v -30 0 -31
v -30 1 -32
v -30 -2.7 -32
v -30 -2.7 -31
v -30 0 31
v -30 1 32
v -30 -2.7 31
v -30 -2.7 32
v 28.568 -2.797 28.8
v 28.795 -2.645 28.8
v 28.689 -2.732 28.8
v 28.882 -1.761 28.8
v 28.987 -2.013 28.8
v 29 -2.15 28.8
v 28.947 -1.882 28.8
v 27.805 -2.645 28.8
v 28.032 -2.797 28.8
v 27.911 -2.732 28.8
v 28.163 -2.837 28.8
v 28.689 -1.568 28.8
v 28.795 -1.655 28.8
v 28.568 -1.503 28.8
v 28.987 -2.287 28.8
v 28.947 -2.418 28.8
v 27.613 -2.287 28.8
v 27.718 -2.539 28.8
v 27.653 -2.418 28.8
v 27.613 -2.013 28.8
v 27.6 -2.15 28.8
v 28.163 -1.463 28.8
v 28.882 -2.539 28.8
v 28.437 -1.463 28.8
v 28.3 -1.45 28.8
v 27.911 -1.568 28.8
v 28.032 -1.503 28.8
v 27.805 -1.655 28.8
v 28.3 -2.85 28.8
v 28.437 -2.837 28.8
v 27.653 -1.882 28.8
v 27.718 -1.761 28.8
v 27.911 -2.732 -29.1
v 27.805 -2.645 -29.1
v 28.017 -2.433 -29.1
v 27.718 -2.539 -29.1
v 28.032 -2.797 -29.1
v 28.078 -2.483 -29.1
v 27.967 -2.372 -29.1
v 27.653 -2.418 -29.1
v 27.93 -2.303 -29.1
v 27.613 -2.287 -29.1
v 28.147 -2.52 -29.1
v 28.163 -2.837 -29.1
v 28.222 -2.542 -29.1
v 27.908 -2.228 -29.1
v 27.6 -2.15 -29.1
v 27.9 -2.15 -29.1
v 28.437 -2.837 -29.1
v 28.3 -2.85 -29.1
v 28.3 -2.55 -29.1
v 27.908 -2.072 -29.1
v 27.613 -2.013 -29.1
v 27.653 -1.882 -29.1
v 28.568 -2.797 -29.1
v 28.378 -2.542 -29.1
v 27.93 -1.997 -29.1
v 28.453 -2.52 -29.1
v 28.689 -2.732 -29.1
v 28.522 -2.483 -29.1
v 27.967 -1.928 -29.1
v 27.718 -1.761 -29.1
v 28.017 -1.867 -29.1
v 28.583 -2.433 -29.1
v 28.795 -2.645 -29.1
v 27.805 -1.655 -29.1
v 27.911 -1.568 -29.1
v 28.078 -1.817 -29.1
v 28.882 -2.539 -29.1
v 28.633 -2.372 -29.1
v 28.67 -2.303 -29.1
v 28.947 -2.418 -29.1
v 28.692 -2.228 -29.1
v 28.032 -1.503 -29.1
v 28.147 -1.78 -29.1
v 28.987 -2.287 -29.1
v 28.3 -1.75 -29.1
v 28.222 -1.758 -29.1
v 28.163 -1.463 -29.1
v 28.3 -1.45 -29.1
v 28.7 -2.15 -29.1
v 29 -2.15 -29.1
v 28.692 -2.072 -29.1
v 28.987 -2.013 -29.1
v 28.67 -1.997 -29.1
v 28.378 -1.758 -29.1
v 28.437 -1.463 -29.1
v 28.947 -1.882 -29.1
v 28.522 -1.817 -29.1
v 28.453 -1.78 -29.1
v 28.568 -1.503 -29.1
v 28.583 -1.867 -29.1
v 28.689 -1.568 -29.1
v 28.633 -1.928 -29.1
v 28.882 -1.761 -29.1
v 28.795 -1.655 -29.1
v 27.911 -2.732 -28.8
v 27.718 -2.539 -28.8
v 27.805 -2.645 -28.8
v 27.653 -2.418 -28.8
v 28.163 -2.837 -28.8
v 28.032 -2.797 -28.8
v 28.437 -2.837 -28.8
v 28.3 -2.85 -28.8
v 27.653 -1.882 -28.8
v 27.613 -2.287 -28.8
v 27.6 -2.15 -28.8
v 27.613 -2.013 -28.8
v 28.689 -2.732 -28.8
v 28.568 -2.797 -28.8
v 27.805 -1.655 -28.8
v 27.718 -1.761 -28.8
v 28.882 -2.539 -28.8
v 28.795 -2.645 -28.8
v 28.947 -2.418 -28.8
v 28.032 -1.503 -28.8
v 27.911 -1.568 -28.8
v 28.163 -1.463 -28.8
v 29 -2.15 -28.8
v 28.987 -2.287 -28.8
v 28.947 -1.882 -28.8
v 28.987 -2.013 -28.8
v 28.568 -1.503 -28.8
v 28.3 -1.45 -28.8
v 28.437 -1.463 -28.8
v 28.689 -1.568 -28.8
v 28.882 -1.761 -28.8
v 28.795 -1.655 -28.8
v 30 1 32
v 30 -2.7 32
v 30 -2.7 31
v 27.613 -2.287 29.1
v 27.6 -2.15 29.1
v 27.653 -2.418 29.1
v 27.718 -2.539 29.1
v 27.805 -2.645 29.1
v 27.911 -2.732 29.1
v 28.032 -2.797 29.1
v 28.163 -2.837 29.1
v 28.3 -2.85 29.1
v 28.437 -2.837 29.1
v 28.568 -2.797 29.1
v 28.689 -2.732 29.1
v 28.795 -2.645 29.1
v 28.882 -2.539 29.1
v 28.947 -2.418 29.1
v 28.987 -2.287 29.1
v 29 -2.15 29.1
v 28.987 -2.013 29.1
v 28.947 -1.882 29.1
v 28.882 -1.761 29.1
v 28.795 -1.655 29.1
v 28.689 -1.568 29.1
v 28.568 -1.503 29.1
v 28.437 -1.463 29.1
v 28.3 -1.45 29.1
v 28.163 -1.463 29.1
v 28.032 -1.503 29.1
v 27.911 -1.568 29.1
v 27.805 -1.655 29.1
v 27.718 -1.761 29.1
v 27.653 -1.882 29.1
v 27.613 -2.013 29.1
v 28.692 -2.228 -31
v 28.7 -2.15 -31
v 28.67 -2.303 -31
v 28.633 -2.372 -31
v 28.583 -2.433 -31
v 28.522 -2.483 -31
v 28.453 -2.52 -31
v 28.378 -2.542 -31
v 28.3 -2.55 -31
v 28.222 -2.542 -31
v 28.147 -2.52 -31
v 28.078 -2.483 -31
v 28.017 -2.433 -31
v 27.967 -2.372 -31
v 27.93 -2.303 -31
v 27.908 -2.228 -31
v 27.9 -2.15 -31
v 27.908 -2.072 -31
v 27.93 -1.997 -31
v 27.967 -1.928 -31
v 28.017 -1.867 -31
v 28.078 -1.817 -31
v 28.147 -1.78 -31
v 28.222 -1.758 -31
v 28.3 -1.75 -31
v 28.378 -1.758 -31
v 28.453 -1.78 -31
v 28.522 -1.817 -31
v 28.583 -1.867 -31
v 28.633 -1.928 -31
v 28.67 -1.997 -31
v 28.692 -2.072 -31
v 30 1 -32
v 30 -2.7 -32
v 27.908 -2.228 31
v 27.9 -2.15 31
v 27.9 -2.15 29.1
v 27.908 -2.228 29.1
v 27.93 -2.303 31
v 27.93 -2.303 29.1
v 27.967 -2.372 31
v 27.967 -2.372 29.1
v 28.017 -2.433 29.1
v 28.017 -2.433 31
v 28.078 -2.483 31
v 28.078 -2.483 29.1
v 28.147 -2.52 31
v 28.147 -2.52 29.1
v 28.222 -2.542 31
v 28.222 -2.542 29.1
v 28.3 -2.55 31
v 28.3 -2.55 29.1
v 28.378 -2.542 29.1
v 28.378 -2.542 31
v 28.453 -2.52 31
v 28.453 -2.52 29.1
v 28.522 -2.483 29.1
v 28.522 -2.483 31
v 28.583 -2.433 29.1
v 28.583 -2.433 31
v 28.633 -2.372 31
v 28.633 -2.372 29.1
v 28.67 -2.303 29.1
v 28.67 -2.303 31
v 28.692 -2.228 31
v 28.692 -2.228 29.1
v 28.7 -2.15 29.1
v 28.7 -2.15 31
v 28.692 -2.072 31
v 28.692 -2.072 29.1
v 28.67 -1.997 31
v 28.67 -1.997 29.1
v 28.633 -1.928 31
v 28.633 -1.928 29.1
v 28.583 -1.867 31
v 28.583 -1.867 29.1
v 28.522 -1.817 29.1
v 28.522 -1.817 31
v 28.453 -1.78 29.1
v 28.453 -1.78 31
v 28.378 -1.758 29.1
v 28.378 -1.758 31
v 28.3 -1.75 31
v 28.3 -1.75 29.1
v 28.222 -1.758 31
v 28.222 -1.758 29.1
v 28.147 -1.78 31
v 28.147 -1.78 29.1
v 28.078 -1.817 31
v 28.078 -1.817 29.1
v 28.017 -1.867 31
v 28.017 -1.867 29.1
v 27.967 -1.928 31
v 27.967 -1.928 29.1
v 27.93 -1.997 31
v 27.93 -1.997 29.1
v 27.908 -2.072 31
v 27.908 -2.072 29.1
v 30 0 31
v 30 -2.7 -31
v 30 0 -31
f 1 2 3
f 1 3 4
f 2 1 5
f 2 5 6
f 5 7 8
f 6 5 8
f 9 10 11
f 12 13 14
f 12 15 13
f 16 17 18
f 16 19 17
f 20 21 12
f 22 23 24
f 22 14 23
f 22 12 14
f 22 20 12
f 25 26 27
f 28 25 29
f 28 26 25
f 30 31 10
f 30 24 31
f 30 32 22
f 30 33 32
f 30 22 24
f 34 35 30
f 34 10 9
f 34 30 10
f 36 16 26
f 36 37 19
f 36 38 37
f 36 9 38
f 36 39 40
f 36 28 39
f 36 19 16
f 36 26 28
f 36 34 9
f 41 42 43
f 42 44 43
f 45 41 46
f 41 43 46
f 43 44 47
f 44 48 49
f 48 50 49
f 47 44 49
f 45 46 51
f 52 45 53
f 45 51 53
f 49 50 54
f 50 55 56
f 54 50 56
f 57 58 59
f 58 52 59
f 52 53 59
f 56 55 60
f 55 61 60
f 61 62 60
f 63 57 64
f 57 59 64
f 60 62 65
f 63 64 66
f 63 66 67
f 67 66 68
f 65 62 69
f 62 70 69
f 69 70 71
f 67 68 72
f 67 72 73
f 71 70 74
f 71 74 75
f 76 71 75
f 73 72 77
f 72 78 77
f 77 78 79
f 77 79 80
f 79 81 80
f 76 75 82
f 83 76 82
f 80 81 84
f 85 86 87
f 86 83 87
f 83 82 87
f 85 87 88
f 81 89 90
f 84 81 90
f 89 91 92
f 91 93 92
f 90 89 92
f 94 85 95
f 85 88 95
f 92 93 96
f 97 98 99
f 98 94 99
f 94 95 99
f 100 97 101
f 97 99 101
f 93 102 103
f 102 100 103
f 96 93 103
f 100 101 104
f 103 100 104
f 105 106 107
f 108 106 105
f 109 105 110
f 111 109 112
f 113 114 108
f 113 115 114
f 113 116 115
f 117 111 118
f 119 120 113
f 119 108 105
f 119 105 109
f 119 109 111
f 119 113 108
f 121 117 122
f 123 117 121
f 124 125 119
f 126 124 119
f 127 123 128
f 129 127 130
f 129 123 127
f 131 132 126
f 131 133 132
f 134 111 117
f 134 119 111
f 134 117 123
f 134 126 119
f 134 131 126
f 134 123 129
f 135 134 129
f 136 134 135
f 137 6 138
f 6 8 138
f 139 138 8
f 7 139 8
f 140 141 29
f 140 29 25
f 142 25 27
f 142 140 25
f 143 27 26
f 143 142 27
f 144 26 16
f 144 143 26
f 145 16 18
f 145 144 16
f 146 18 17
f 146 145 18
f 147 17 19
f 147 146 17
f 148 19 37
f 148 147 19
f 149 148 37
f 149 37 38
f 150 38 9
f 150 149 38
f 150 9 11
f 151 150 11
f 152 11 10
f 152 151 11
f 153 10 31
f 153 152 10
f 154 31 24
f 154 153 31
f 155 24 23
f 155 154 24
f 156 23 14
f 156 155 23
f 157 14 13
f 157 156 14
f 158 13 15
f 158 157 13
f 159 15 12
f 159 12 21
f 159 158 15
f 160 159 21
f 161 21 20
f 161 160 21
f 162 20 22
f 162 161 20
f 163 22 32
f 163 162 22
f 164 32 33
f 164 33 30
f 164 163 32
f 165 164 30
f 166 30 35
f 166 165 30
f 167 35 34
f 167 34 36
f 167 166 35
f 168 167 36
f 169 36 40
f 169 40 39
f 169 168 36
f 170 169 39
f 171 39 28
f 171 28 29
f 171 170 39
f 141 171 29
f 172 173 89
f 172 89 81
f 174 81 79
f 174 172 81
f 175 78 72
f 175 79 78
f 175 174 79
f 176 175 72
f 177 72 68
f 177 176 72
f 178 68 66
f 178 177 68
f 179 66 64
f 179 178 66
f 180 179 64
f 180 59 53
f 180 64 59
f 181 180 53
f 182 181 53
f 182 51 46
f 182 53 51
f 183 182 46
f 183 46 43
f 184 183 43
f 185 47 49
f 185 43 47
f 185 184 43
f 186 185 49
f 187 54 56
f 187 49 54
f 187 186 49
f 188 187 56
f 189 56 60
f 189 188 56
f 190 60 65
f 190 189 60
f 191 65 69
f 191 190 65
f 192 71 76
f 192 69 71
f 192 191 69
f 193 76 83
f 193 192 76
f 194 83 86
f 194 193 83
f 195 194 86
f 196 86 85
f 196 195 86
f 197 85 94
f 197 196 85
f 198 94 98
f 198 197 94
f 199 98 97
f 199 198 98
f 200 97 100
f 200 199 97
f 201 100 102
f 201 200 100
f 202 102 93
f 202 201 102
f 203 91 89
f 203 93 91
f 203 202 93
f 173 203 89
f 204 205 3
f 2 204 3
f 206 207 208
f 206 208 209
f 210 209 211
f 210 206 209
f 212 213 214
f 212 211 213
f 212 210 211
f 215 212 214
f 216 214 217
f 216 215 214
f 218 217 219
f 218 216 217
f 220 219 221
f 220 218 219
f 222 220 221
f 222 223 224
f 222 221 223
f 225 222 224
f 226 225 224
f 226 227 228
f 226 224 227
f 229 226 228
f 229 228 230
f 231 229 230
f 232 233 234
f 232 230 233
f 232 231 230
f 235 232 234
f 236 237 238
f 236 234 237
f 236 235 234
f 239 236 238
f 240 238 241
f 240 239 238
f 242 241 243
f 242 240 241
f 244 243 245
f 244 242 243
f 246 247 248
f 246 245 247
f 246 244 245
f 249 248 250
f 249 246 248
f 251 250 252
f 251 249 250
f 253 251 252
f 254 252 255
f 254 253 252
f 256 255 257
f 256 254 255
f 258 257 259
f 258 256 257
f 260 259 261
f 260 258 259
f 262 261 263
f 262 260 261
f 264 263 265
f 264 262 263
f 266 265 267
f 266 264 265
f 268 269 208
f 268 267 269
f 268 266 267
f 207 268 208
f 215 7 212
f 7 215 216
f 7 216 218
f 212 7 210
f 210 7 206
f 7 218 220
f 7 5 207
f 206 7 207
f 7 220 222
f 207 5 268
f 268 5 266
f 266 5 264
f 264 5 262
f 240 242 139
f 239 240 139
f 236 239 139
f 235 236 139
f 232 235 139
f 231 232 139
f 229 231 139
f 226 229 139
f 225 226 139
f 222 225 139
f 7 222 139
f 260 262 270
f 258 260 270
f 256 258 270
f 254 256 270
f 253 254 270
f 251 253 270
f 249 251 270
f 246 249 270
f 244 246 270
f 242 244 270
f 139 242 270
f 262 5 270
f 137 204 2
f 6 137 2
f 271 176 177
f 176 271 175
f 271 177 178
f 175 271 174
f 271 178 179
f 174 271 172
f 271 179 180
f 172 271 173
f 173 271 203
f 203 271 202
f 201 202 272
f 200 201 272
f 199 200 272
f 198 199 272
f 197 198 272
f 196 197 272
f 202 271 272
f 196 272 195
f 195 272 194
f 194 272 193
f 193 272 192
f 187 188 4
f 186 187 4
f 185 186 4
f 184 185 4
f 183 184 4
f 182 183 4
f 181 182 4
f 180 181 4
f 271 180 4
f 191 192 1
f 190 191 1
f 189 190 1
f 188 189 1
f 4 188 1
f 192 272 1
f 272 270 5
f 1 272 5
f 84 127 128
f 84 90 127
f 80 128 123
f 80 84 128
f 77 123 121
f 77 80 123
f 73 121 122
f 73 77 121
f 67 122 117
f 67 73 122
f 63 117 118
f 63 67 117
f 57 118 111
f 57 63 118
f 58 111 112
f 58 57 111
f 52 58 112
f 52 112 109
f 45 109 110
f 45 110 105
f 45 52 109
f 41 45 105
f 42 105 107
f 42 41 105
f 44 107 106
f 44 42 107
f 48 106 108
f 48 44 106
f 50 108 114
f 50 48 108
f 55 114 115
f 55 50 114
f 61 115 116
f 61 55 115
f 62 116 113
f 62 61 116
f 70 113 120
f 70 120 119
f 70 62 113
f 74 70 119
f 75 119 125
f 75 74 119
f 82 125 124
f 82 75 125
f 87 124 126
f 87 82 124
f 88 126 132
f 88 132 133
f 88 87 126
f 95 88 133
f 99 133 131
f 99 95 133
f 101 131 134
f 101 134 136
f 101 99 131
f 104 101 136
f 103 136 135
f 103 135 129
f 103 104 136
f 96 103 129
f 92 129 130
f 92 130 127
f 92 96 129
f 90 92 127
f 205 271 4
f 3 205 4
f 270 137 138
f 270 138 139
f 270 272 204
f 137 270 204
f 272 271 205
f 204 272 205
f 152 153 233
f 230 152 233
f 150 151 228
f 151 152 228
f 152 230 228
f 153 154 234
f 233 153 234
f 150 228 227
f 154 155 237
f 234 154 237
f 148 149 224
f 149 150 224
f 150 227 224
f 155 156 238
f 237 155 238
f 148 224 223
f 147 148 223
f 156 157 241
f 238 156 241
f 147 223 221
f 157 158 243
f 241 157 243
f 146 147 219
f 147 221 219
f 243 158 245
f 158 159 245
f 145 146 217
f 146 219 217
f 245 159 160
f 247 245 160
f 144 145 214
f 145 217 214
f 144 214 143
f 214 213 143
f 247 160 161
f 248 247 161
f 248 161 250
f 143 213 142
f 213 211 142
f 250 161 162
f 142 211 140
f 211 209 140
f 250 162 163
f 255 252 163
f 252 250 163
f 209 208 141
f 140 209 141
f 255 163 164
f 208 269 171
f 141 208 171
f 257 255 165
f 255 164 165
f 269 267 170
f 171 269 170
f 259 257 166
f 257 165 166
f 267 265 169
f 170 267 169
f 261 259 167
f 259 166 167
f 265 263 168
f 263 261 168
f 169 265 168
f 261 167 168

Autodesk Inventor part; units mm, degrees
ref_plane "YZ Plane" through (0, 0, 0) normal (1, 0, 0) x (0, 1, 0)
ref_plane "XZ Plane" through (0, 0, 0) normal (0, 1, 0) x (-1, 0, 0)
ref_plane "XY Plane" through (0, 0, 0) normal (0, 0, 1) x (1, 0, 0)
sketch "Schizzo1" plane through (0, 0, 0) normal (0, 1, 0) x (-1, 0, 0)
  line L0 (30, 32) -> (-30, 32)
  line L1 (-30, 32) -> (-30, -32)
  line L2 (-30, -32) -> (30, -32)
  line L3 (30, -32) -> (30, 32)
  line L4 (0, 0) -> (41.9471, 0) construction
  line L5 (0, 0) -> (0, -48.4274) construction
  line L6 (28.8, 32) -> (28.8, 29.75) construction
  line L7 (28.8, 29.75) -> (30, 29.75) construction
  line L8 (28.8, 29.75) -> (28.1, 29.75) construction
  circle A0 centre (28.1, 29.75) radius 0.35
  line L9 (28.8, -32) -> (28.8, -29.75) construction
  line L10 (28.8, -29.75) -> (30, -29.75) construction
  line L11 (28.8, -29.75) -> (28.1, -29.75) construction
  circle A1 centre (28.1, -29.75) radius 0.7
  circle A2 centre (28.1, -29.75) radius 0.35
  circle A3 centre (28.1, 29.75) radius 0.65
  line L12 (30, 31) -> (-30, 31)
  line L13 (-30, 31) -> (-30, -31)
  line L14 (-30, -31) -> (30, -31)
  line L15 (30, -31) -> (30, 31)
  dimension "d0" = 60
  dimension "d1" = 64
  dimension "d2" = 2.25
  dimension "d3" = 1.2
  dimension "d4" = 0.7
  dimension "d5" = 0.7
  dimension "d8" = 1.3
  dimension "d9" = 62
extrude "Estrusione1" add sketch "Schizzo1" along normal blind 1 contours L3 L12 L1 L0 | L3 L14 L1 L12 | L3 L2 L1 L14 | A0 | A1 | A2 | A3
extrude "Estrusione2" add sketch "Schizzo1" against normal blind 2.7 contours L3 L12 L1 L0 | L3 L2 L1 L14
sketch "Schizzo2" plane through (30, 0, 31) normal (0, 0, -1) x (-1, 0, 0)
  line L0 (0, -2.7) -> (60, -2.7) projected
  line L1 (0, -2.7) -> (0, 1) construction
  line L2 (0, -0.5) -> (6.4394, -0.5) construction
  line L3 (0, -0.5) -> (0, -0.65) construction
  line L4 (0, -0.65) -> (0, -2.15) construction
  line L5 (0, -2.15) -> (1, -2.15) construction
  line L6 (1, -2.15) -> (1.7, -2.15) construction
  circle A0 centre (1.7, -2.15) radius 0.7
  circle A1 centre (1.7, -2.15) radius 0.4
  line L7 (0, -0.5) -> (0, 0) construction
  point P0 (30, 0)
  dimension "d14" = 2.2
  dimension "d15" = 0.15
  dimension "d16" = 1.5
  dimension "d17" = 1
  dimension "d18" = 0.7
  dimension "d19" = 1.4
  dimension "d20" = 0.8
extrude "Estrusione3" add sketch "Schizzo2" along normal blind 2.2 contours A0 L0 | L0 A0 | A1
extrude "Estrusione4" cut sketch "Schizzo2" along normal blind 1.9
sketch "Schizzo3" plane through (-30, 0, -31) normal (0, 0, 1) x (1, 0, 0)
  line L0 (60, -2.7) -> (60, 1) projected
  line L1 (0, -2.7) -> (60, -2.7) projected
  line L2 (60, 0) -> (60, -0.65) construction
  line L3 (60, -0.65) -> (60, -2.15) construction
  line L4 (60, -2.15) -> (59, -2.15) construction
  line L5 (59, -2.15) -> (58.3, -2.15) construction
  circle A0 centre (58.3, -2.15) radius 0.7
  circle A1 centre (58.3, -2.15) radius 0.4
  line L6 (0, 0) -> (60, 0) projected
  point P0 (30, 0)
  dimension "d26" = 0.65
  dimension "d27" = 1.5
  dimension "d28" = 1
  dimension "d29" = 0.7
  dimension "d30" = 1.4
  dimension "d31" = 0.8
extrude "Estrusione5" add sketch "Schizzo3" along normal blind 2.2 contours A0 L1 | L1 A0 | A1
extrude "Estrusione6" cut sketch "Schizzo3" along normal blind 1.9
properties part number "coperchio contieni SD"
